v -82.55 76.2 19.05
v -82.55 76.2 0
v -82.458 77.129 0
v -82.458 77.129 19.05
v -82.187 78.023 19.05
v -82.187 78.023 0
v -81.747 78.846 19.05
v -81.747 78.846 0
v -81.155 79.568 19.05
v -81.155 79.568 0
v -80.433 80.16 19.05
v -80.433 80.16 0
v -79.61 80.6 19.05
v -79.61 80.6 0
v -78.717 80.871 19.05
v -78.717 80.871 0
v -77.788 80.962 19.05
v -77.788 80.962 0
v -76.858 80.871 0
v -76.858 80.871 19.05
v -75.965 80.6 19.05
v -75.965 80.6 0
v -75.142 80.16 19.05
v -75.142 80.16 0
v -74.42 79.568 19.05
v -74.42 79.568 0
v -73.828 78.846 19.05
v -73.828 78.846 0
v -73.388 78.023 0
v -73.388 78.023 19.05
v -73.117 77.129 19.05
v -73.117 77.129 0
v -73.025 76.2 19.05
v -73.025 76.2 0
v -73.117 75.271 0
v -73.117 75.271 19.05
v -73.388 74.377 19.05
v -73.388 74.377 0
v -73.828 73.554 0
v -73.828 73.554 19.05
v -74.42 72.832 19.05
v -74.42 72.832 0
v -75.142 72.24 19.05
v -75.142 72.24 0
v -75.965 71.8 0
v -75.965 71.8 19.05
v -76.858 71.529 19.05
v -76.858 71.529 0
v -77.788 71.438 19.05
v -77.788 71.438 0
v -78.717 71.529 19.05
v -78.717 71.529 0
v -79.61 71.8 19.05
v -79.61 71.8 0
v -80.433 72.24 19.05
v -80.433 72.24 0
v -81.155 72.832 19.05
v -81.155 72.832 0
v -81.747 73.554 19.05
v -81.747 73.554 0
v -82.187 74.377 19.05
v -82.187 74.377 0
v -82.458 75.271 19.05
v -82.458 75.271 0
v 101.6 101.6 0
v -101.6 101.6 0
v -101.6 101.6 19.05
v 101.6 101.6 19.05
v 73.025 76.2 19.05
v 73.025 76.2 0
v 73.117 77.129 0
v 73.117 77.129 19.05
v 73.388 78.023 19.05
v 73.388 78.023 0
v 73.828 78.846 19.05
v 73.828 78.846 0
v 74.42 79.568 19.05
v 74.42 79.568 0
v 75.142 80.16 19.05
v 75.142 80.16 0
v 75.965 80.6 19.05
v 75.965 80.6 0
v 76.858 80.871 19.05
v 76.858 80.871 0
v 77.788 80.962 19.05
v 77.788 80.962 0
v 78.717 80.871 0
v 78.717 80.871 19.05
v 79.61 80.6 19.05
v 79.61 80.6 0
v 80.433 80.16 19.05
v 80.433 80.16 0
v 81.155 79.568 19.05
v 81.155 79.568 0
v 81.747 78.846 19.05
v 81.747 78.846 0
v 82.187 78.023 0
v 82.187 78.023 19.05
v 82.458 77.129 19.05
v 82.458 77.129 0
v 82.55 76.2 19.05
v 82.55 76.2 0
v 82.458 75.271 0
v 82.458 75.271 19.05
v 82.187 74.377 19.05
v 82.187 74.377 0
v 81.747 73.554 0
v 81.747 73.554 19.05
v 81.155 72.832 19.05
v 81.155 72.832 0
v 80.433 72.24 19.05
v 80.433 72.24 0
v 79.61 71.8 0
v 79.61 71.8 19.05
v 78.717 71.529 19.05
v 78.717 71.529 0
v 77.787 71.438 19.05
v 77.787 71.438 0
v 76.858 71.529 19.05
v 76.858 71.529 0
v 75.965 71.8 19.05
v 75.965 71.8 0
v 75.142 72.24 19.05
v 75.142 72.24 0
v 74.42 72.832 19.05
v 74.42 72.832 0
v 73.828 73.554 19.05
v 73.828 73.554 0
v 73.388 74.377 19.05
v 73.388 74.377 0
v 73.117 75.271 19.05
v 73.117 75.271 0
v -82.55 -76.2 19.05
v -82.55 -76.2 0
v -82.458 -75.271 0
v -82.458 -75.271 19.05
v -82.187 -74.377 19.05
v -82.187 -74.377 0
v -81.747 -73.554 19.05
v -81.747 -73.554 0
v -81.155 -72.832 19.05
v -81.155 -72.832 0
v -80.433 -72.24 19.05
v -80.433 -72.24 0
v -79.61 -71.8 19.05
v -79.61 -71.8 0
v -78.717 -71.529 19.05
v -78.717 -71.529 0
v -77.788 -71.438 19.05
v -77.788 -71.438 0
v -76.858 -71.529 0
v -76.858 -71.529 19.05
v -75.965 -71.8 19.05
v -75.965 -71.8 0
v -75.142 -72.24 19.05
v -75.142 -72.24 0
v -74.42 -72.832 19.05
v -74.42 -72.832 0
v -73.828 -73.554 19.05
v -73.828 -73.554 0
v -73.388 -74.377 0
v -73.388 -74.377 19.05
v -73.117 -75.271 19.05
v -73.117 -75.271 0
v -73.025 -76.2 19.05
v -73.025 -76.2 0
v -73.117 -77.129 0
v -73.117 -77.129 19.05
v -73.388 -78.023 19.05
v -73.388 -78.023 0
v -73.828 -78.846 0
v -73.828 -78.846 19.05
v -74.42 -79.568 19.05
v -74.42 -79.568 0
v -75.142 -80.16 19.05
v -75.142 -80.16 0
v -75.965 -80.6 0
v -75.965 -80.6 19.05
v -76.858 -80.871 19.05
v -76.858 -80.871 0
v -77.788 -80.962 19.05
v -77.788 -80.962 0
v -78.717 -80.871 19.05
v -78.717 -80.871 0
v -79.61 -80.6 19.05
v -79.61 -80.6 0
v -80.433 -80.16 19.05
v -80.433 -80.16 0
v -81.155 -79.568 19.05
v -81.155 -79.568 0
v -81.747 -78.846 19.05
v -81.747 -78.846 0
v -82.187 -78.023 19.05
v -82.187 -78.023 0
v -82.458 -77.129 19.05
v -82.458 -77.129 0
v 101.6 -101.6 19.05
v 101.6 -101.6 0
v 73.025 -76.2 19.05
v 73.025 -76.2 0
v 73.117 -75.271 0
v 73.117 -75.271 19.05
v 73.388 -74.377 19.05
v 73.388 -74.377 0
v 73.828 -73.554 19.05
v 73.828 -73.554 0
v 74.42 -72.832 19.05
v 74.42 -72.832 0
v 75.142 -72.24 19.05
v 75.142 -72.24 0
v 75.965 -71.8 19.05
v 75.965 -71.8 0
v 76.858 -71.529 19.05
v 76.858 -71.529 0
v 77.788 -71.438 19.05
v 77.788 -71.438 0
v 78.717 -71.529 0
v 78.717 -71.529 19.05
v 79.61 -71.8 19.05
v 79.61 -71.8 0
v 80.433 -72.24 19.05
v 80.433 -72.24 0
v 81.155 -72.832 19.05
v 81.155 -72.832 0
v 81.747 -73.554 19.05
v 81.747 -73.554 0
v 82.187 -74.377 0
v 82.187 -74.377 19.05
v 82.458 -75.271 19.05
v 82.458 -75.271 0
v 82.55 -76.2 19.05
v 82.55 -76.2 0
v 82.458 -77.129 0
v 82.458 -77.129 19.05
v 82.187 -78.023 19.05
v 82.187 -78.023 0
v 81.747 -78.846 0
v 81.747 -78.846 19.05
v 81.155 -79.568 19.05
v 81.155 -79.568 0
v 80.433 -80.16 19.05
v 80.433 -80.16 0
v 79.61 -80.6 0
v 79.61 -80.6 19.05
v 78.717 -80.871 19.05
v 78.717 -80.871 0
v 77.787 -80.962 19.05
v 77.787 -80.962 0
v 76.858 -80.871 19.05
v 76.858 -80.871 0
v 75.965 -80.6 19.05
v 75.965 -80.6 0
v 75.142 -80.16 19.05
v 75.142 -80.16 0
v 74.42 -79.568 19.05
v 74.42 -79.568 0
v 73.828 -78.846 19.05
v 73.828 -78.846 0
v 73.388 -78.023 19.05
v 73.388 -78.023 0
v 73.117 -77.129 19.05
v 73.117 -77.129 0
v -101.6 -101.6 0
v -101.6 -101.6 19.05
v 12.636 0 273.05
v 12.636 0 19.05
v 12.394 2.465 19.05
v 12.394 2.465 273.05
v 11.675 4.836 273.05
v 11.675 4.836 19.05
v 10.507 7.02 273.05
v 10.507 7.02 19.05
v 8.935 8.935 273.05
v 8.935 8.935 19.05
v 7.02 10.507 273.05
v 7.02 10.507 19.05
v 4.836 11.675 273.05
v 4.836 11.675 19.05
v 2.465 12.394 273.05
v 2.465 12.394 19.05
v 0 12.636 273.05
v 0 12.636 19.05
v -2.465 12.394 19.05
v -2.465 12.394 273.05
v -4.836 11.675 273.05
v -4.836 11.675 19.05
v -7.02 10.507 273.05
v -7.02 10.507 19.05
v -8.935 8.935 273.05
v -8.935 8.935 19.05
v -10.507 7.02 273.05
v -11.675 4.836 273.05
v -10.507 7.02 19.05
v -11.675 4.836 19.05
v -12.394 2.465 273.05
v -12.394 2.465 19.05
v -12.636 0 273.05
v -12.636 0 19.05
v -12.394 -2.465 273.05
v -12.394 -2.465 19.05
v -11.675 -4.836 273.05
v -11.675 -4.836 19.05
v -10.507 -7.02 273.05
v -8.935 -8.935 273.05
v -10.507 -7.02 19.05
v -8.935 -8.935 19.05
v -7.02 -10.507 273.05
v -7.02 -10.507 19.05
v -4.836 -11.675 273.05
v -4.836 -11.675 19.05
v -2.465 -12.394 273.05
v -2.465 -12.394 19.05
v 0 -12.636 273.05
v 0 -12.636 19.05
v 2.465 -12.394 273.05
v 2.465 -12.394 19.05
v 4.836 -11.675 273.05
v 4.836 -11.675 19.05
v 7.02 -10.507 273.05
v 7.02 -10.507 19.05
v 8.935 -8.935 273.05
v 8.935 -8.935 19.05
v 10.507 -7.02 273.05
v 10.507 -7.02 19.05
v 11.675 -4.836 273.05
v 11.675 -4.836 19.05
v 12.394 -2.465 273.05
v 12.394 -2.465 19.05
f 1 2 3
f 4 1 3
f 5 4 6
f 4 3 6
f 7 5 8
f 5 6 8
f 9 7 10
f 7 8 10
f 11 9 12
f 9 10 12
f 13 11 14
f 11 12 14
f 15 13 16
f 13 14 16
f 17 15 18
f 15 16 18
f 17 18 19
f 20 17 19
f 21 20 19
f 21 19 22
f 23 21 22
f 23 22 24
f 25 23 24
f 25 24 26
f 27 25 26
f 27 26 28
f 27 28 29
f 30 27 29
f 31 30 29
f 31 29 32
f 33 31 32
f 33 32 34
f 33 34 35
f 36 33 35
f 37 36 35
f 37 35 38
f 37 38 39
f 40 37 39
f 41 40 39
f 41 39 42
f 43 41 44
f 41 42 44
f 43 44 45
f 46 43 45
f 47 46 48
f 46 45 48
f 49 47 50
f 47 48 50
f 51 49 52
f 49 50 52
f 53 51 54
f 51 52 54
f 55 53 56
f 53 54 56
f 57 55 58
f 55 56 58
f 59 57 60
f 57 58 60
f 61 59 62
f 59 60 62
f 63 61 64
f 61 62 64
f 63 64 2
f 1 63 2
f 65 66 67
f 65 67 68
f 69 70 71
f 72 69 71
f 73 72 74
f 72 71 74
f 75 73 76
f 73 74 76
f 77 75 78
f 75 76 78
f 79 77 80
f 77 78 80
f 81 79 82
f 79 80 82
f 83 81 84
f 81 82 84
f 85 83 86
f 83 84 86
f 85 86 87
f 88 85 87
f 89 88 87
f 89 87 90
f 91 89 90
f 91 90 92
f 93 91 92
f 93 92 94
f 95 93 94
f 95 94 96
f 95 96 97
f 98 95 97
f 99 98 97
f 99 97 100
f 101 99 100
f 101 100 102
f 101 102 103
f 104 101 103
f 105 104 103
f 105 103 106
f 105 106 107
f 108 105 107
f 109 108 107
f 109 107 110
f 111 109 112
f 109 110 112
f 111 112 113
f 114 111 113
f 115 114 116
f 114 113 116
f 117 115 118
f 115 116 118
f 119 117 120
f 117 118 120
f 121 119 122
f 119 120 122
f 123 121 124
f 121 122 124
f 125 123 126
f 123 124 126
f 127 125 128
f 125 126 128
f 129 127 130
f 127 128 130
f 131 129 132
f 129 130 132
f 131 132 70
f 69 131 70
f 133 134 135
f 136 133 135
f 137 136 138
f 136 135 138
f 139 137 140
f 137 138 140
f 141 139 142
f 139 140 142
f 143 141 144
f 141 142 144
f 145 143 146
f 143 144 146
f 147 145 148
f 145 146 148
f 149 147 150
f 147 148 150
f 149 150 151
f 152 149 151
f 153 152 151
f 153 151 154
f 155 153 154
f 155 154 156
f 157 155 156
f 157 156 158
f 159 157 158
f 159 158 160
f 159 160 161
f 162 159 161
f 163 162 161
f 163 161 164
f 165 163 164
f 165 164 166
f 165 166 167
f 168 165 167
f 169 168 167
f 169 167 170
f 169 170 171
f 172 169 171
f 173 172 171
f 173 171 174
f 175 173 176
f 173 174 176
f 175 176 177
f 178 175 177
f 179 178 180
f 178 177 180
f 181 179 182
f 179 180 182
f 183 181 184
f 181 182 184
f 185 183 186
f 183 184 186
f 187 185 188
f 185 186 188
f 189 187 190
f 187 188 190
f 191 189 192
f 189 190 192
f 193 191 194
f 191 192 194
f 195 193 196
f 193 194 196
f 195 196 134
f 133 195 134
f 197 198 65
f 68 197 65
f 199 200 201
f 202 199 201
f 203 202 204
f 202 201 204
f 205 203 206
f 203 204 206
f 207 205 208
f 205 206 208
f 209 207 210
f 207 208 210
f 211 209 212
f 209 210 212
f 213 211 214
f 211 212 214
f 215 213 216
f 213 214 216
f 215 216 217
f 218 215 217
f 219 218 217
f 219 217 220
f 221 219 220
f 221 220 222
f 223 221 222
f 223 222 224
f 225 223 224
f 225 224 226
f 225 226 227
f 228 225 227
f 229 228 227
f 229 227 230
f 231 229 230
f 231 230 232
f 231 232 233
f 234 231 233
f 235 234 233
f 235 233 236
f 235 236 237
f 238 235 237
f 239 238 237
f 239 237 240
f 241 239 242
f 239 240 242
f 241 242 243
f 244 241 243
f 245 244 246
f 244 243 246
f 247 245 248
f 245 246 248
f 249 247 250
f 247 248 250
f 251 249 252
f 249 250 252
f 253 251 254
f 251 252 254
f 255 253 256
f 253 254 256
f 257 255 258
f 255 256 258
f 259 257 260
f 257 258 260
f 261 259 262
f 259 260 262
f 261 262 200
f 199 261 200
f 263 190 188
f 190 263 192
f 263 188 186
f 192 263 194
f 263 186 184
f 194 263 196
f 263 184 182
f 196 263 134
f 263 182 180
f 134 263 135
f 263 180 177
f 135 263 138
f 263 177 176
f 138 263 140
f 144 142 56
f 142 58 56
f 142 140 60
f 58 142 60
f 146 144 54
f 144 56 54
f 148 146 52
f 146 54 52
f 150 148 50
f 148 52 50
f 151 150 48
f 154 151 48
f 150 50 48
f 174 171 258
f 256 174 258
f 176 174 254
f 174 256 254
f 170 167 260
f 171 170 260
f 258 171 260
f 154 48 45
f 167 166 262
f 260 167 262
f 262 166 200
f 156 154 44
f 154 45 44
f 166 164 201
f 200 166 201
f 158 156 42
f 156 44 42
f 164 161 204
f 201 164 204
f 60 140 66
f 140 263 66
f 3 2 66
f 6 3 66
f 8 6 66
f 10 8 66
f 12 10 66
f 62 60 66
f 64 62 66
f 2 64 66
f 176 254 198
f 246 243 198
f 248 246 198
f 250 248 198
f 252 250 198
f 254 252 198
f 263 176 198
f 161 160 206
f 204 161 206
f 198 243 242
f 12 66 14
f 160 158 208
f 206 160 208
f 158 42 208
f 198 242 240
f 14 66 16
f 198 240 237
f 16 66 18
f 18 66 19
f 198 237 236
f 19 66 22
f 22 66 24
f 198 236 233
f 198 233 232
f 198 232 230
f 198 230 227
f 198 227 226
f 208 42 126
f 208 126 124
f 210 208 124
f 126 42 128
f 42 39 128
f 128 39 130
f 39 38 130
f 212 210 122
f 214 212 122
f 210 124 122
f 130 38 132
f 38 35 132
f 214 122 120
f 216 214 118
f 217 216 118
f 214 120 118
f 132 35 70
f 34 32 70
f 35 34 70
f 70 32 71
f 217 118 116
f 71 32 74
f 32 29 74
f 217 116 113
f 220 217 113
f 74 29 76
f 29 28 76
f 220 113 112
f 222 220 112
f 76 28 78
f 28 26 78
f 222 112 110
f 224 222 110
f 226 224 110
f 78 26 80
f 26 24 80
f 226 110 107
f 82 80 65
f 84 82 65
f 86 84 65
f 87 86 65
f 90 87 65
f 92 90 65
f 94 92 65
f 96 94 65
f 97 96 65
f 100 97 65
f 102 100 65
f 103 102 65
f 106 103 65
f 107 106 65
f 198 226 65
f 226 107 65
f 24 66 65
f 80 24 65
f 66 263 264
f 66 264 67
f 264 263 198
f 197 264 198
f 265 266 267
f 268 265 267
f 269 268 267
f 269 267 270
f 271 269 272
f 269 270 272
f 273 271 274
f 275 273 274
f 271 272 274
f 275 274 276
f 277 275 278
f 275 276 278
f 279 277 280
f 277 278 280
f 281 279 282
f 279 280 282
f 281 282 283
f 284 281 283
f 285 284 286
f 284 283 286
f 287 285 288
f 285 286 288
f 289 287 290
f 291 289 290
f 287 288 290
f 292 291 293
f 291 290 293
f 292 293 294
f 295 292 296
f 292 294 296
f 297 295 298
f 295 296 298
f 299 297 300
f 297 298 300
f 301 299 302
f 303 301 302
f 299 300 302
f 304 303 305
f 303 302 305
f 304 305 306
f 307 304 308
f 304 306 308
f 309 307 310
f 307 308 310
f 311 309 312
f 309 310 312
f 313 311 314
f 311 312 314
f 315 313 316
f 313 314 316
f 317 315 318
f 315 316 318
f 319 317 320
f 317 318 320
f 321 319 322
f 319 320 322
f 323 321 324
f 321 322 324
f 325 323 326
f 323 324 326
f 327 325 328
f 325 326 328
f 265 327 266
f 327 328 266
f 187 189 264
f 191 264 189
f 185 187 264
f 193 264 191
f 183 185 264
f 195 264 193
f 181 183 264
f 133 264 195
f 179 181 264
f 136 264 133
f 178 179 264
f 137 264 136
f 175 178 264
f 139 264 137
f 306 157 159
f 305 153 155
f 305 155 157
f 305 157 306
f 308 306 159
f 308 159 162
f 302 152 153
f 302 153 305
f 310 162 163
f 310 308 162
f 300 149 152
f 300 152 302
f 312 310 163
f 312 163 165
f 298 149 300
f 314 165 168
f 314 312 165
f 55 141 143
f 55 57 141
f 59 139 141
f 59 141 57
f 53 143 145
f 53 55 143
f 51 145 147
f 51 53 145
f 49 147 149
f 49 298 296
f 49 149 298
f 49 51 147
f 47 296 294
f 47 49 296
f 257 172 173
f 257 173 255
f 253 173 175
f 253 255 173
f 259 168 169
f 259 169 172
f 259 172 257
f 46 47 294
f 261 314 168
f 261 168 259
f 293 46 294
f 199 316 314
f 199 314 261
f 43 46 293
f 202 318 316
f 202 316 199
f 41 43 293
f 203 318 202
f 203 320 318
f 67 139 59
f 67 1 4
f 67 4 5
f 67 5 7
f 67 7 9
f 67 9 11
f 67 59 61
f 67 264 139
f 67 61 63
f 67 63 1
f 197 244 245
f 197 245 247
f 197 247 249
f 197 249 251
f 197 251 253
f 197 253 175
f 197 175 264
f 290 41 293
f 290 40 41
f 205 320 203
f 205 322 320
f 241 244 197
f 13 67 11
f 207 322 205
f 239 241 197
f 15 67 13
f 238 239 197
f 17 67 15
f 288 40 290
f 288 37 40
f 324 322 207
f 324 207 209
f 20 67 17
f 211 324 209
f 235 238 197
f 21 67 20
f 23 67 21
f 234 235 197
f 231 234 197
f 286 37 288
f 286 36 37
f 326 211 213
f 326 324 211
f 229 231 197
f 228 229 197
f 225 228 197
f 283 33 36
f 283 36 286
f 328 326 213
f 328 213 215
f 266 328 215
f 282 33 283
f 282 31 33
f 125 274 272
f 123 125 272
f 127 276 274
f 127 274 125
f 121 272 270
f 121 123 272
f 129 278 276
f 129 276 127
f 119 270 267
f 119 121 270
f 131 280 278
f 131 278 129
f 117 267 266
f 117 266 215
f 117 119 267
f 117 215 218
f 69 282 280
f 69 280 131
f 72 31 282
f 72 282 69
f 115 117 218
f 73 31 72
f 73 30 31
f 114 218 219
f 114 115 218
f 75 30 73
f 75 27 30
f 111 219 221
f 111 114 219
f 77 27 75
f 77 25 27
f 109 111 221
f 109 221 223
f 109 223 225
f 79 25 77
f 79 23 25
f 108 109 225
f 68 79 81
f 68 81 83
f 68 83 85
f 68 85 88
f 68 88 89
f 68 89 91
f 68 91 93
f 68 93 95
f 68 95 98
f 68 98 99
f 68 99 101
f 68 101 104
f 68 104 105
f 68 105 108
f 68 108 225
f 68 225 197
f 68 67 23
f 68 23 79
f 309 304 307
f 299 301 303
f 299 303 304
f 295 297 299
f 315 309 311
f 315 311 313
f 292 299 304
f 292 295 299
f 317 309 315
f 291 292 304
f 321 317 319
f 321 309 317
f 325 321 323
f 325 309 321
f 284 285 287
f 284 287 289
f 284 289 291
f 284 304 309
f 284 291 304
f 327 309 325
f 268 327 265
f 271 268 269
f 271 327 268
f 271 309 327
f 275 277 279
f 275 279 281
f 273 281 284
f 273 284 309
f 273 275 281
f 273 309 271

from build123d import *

# Parameters (mm, degrees)
F0_W     = 203.2
F0_H     = 203.2
F1_DEPTH = 19.05
F3_D     = 9.525
F4_R     = 12.6365
F5_DEPTH = 254


# Not quite as in the source:
# - a length typed as a fraction of an inch, garbled in the dataset ("3 / 203.2 mm" for 3/8 in), is restored


with BuildPart() as f1:
    # F0 (on Top) → F1 (new body)
    with BuildSketch(Plane.XY):
        Rectangle(F0_W, F0_H)
    extrude(amount=F1_DEPTH)

    # F3 (through all)
    with Locations(Plane.XY.offset(19.05)):
        with Locations((-77.7875, 76.2), (77.7875, 76.2), (-77.7875, -76.2), (77.7875, -76.2)):
            Hole(F3_D / 2)

    # F4 (on face) → F5 (join)
    with BuildSketch(Plane.XY.offset(19.05)):
        Circle(F4_R)
    extrude(amount=F5_DEPTH)


solid = f1.part
